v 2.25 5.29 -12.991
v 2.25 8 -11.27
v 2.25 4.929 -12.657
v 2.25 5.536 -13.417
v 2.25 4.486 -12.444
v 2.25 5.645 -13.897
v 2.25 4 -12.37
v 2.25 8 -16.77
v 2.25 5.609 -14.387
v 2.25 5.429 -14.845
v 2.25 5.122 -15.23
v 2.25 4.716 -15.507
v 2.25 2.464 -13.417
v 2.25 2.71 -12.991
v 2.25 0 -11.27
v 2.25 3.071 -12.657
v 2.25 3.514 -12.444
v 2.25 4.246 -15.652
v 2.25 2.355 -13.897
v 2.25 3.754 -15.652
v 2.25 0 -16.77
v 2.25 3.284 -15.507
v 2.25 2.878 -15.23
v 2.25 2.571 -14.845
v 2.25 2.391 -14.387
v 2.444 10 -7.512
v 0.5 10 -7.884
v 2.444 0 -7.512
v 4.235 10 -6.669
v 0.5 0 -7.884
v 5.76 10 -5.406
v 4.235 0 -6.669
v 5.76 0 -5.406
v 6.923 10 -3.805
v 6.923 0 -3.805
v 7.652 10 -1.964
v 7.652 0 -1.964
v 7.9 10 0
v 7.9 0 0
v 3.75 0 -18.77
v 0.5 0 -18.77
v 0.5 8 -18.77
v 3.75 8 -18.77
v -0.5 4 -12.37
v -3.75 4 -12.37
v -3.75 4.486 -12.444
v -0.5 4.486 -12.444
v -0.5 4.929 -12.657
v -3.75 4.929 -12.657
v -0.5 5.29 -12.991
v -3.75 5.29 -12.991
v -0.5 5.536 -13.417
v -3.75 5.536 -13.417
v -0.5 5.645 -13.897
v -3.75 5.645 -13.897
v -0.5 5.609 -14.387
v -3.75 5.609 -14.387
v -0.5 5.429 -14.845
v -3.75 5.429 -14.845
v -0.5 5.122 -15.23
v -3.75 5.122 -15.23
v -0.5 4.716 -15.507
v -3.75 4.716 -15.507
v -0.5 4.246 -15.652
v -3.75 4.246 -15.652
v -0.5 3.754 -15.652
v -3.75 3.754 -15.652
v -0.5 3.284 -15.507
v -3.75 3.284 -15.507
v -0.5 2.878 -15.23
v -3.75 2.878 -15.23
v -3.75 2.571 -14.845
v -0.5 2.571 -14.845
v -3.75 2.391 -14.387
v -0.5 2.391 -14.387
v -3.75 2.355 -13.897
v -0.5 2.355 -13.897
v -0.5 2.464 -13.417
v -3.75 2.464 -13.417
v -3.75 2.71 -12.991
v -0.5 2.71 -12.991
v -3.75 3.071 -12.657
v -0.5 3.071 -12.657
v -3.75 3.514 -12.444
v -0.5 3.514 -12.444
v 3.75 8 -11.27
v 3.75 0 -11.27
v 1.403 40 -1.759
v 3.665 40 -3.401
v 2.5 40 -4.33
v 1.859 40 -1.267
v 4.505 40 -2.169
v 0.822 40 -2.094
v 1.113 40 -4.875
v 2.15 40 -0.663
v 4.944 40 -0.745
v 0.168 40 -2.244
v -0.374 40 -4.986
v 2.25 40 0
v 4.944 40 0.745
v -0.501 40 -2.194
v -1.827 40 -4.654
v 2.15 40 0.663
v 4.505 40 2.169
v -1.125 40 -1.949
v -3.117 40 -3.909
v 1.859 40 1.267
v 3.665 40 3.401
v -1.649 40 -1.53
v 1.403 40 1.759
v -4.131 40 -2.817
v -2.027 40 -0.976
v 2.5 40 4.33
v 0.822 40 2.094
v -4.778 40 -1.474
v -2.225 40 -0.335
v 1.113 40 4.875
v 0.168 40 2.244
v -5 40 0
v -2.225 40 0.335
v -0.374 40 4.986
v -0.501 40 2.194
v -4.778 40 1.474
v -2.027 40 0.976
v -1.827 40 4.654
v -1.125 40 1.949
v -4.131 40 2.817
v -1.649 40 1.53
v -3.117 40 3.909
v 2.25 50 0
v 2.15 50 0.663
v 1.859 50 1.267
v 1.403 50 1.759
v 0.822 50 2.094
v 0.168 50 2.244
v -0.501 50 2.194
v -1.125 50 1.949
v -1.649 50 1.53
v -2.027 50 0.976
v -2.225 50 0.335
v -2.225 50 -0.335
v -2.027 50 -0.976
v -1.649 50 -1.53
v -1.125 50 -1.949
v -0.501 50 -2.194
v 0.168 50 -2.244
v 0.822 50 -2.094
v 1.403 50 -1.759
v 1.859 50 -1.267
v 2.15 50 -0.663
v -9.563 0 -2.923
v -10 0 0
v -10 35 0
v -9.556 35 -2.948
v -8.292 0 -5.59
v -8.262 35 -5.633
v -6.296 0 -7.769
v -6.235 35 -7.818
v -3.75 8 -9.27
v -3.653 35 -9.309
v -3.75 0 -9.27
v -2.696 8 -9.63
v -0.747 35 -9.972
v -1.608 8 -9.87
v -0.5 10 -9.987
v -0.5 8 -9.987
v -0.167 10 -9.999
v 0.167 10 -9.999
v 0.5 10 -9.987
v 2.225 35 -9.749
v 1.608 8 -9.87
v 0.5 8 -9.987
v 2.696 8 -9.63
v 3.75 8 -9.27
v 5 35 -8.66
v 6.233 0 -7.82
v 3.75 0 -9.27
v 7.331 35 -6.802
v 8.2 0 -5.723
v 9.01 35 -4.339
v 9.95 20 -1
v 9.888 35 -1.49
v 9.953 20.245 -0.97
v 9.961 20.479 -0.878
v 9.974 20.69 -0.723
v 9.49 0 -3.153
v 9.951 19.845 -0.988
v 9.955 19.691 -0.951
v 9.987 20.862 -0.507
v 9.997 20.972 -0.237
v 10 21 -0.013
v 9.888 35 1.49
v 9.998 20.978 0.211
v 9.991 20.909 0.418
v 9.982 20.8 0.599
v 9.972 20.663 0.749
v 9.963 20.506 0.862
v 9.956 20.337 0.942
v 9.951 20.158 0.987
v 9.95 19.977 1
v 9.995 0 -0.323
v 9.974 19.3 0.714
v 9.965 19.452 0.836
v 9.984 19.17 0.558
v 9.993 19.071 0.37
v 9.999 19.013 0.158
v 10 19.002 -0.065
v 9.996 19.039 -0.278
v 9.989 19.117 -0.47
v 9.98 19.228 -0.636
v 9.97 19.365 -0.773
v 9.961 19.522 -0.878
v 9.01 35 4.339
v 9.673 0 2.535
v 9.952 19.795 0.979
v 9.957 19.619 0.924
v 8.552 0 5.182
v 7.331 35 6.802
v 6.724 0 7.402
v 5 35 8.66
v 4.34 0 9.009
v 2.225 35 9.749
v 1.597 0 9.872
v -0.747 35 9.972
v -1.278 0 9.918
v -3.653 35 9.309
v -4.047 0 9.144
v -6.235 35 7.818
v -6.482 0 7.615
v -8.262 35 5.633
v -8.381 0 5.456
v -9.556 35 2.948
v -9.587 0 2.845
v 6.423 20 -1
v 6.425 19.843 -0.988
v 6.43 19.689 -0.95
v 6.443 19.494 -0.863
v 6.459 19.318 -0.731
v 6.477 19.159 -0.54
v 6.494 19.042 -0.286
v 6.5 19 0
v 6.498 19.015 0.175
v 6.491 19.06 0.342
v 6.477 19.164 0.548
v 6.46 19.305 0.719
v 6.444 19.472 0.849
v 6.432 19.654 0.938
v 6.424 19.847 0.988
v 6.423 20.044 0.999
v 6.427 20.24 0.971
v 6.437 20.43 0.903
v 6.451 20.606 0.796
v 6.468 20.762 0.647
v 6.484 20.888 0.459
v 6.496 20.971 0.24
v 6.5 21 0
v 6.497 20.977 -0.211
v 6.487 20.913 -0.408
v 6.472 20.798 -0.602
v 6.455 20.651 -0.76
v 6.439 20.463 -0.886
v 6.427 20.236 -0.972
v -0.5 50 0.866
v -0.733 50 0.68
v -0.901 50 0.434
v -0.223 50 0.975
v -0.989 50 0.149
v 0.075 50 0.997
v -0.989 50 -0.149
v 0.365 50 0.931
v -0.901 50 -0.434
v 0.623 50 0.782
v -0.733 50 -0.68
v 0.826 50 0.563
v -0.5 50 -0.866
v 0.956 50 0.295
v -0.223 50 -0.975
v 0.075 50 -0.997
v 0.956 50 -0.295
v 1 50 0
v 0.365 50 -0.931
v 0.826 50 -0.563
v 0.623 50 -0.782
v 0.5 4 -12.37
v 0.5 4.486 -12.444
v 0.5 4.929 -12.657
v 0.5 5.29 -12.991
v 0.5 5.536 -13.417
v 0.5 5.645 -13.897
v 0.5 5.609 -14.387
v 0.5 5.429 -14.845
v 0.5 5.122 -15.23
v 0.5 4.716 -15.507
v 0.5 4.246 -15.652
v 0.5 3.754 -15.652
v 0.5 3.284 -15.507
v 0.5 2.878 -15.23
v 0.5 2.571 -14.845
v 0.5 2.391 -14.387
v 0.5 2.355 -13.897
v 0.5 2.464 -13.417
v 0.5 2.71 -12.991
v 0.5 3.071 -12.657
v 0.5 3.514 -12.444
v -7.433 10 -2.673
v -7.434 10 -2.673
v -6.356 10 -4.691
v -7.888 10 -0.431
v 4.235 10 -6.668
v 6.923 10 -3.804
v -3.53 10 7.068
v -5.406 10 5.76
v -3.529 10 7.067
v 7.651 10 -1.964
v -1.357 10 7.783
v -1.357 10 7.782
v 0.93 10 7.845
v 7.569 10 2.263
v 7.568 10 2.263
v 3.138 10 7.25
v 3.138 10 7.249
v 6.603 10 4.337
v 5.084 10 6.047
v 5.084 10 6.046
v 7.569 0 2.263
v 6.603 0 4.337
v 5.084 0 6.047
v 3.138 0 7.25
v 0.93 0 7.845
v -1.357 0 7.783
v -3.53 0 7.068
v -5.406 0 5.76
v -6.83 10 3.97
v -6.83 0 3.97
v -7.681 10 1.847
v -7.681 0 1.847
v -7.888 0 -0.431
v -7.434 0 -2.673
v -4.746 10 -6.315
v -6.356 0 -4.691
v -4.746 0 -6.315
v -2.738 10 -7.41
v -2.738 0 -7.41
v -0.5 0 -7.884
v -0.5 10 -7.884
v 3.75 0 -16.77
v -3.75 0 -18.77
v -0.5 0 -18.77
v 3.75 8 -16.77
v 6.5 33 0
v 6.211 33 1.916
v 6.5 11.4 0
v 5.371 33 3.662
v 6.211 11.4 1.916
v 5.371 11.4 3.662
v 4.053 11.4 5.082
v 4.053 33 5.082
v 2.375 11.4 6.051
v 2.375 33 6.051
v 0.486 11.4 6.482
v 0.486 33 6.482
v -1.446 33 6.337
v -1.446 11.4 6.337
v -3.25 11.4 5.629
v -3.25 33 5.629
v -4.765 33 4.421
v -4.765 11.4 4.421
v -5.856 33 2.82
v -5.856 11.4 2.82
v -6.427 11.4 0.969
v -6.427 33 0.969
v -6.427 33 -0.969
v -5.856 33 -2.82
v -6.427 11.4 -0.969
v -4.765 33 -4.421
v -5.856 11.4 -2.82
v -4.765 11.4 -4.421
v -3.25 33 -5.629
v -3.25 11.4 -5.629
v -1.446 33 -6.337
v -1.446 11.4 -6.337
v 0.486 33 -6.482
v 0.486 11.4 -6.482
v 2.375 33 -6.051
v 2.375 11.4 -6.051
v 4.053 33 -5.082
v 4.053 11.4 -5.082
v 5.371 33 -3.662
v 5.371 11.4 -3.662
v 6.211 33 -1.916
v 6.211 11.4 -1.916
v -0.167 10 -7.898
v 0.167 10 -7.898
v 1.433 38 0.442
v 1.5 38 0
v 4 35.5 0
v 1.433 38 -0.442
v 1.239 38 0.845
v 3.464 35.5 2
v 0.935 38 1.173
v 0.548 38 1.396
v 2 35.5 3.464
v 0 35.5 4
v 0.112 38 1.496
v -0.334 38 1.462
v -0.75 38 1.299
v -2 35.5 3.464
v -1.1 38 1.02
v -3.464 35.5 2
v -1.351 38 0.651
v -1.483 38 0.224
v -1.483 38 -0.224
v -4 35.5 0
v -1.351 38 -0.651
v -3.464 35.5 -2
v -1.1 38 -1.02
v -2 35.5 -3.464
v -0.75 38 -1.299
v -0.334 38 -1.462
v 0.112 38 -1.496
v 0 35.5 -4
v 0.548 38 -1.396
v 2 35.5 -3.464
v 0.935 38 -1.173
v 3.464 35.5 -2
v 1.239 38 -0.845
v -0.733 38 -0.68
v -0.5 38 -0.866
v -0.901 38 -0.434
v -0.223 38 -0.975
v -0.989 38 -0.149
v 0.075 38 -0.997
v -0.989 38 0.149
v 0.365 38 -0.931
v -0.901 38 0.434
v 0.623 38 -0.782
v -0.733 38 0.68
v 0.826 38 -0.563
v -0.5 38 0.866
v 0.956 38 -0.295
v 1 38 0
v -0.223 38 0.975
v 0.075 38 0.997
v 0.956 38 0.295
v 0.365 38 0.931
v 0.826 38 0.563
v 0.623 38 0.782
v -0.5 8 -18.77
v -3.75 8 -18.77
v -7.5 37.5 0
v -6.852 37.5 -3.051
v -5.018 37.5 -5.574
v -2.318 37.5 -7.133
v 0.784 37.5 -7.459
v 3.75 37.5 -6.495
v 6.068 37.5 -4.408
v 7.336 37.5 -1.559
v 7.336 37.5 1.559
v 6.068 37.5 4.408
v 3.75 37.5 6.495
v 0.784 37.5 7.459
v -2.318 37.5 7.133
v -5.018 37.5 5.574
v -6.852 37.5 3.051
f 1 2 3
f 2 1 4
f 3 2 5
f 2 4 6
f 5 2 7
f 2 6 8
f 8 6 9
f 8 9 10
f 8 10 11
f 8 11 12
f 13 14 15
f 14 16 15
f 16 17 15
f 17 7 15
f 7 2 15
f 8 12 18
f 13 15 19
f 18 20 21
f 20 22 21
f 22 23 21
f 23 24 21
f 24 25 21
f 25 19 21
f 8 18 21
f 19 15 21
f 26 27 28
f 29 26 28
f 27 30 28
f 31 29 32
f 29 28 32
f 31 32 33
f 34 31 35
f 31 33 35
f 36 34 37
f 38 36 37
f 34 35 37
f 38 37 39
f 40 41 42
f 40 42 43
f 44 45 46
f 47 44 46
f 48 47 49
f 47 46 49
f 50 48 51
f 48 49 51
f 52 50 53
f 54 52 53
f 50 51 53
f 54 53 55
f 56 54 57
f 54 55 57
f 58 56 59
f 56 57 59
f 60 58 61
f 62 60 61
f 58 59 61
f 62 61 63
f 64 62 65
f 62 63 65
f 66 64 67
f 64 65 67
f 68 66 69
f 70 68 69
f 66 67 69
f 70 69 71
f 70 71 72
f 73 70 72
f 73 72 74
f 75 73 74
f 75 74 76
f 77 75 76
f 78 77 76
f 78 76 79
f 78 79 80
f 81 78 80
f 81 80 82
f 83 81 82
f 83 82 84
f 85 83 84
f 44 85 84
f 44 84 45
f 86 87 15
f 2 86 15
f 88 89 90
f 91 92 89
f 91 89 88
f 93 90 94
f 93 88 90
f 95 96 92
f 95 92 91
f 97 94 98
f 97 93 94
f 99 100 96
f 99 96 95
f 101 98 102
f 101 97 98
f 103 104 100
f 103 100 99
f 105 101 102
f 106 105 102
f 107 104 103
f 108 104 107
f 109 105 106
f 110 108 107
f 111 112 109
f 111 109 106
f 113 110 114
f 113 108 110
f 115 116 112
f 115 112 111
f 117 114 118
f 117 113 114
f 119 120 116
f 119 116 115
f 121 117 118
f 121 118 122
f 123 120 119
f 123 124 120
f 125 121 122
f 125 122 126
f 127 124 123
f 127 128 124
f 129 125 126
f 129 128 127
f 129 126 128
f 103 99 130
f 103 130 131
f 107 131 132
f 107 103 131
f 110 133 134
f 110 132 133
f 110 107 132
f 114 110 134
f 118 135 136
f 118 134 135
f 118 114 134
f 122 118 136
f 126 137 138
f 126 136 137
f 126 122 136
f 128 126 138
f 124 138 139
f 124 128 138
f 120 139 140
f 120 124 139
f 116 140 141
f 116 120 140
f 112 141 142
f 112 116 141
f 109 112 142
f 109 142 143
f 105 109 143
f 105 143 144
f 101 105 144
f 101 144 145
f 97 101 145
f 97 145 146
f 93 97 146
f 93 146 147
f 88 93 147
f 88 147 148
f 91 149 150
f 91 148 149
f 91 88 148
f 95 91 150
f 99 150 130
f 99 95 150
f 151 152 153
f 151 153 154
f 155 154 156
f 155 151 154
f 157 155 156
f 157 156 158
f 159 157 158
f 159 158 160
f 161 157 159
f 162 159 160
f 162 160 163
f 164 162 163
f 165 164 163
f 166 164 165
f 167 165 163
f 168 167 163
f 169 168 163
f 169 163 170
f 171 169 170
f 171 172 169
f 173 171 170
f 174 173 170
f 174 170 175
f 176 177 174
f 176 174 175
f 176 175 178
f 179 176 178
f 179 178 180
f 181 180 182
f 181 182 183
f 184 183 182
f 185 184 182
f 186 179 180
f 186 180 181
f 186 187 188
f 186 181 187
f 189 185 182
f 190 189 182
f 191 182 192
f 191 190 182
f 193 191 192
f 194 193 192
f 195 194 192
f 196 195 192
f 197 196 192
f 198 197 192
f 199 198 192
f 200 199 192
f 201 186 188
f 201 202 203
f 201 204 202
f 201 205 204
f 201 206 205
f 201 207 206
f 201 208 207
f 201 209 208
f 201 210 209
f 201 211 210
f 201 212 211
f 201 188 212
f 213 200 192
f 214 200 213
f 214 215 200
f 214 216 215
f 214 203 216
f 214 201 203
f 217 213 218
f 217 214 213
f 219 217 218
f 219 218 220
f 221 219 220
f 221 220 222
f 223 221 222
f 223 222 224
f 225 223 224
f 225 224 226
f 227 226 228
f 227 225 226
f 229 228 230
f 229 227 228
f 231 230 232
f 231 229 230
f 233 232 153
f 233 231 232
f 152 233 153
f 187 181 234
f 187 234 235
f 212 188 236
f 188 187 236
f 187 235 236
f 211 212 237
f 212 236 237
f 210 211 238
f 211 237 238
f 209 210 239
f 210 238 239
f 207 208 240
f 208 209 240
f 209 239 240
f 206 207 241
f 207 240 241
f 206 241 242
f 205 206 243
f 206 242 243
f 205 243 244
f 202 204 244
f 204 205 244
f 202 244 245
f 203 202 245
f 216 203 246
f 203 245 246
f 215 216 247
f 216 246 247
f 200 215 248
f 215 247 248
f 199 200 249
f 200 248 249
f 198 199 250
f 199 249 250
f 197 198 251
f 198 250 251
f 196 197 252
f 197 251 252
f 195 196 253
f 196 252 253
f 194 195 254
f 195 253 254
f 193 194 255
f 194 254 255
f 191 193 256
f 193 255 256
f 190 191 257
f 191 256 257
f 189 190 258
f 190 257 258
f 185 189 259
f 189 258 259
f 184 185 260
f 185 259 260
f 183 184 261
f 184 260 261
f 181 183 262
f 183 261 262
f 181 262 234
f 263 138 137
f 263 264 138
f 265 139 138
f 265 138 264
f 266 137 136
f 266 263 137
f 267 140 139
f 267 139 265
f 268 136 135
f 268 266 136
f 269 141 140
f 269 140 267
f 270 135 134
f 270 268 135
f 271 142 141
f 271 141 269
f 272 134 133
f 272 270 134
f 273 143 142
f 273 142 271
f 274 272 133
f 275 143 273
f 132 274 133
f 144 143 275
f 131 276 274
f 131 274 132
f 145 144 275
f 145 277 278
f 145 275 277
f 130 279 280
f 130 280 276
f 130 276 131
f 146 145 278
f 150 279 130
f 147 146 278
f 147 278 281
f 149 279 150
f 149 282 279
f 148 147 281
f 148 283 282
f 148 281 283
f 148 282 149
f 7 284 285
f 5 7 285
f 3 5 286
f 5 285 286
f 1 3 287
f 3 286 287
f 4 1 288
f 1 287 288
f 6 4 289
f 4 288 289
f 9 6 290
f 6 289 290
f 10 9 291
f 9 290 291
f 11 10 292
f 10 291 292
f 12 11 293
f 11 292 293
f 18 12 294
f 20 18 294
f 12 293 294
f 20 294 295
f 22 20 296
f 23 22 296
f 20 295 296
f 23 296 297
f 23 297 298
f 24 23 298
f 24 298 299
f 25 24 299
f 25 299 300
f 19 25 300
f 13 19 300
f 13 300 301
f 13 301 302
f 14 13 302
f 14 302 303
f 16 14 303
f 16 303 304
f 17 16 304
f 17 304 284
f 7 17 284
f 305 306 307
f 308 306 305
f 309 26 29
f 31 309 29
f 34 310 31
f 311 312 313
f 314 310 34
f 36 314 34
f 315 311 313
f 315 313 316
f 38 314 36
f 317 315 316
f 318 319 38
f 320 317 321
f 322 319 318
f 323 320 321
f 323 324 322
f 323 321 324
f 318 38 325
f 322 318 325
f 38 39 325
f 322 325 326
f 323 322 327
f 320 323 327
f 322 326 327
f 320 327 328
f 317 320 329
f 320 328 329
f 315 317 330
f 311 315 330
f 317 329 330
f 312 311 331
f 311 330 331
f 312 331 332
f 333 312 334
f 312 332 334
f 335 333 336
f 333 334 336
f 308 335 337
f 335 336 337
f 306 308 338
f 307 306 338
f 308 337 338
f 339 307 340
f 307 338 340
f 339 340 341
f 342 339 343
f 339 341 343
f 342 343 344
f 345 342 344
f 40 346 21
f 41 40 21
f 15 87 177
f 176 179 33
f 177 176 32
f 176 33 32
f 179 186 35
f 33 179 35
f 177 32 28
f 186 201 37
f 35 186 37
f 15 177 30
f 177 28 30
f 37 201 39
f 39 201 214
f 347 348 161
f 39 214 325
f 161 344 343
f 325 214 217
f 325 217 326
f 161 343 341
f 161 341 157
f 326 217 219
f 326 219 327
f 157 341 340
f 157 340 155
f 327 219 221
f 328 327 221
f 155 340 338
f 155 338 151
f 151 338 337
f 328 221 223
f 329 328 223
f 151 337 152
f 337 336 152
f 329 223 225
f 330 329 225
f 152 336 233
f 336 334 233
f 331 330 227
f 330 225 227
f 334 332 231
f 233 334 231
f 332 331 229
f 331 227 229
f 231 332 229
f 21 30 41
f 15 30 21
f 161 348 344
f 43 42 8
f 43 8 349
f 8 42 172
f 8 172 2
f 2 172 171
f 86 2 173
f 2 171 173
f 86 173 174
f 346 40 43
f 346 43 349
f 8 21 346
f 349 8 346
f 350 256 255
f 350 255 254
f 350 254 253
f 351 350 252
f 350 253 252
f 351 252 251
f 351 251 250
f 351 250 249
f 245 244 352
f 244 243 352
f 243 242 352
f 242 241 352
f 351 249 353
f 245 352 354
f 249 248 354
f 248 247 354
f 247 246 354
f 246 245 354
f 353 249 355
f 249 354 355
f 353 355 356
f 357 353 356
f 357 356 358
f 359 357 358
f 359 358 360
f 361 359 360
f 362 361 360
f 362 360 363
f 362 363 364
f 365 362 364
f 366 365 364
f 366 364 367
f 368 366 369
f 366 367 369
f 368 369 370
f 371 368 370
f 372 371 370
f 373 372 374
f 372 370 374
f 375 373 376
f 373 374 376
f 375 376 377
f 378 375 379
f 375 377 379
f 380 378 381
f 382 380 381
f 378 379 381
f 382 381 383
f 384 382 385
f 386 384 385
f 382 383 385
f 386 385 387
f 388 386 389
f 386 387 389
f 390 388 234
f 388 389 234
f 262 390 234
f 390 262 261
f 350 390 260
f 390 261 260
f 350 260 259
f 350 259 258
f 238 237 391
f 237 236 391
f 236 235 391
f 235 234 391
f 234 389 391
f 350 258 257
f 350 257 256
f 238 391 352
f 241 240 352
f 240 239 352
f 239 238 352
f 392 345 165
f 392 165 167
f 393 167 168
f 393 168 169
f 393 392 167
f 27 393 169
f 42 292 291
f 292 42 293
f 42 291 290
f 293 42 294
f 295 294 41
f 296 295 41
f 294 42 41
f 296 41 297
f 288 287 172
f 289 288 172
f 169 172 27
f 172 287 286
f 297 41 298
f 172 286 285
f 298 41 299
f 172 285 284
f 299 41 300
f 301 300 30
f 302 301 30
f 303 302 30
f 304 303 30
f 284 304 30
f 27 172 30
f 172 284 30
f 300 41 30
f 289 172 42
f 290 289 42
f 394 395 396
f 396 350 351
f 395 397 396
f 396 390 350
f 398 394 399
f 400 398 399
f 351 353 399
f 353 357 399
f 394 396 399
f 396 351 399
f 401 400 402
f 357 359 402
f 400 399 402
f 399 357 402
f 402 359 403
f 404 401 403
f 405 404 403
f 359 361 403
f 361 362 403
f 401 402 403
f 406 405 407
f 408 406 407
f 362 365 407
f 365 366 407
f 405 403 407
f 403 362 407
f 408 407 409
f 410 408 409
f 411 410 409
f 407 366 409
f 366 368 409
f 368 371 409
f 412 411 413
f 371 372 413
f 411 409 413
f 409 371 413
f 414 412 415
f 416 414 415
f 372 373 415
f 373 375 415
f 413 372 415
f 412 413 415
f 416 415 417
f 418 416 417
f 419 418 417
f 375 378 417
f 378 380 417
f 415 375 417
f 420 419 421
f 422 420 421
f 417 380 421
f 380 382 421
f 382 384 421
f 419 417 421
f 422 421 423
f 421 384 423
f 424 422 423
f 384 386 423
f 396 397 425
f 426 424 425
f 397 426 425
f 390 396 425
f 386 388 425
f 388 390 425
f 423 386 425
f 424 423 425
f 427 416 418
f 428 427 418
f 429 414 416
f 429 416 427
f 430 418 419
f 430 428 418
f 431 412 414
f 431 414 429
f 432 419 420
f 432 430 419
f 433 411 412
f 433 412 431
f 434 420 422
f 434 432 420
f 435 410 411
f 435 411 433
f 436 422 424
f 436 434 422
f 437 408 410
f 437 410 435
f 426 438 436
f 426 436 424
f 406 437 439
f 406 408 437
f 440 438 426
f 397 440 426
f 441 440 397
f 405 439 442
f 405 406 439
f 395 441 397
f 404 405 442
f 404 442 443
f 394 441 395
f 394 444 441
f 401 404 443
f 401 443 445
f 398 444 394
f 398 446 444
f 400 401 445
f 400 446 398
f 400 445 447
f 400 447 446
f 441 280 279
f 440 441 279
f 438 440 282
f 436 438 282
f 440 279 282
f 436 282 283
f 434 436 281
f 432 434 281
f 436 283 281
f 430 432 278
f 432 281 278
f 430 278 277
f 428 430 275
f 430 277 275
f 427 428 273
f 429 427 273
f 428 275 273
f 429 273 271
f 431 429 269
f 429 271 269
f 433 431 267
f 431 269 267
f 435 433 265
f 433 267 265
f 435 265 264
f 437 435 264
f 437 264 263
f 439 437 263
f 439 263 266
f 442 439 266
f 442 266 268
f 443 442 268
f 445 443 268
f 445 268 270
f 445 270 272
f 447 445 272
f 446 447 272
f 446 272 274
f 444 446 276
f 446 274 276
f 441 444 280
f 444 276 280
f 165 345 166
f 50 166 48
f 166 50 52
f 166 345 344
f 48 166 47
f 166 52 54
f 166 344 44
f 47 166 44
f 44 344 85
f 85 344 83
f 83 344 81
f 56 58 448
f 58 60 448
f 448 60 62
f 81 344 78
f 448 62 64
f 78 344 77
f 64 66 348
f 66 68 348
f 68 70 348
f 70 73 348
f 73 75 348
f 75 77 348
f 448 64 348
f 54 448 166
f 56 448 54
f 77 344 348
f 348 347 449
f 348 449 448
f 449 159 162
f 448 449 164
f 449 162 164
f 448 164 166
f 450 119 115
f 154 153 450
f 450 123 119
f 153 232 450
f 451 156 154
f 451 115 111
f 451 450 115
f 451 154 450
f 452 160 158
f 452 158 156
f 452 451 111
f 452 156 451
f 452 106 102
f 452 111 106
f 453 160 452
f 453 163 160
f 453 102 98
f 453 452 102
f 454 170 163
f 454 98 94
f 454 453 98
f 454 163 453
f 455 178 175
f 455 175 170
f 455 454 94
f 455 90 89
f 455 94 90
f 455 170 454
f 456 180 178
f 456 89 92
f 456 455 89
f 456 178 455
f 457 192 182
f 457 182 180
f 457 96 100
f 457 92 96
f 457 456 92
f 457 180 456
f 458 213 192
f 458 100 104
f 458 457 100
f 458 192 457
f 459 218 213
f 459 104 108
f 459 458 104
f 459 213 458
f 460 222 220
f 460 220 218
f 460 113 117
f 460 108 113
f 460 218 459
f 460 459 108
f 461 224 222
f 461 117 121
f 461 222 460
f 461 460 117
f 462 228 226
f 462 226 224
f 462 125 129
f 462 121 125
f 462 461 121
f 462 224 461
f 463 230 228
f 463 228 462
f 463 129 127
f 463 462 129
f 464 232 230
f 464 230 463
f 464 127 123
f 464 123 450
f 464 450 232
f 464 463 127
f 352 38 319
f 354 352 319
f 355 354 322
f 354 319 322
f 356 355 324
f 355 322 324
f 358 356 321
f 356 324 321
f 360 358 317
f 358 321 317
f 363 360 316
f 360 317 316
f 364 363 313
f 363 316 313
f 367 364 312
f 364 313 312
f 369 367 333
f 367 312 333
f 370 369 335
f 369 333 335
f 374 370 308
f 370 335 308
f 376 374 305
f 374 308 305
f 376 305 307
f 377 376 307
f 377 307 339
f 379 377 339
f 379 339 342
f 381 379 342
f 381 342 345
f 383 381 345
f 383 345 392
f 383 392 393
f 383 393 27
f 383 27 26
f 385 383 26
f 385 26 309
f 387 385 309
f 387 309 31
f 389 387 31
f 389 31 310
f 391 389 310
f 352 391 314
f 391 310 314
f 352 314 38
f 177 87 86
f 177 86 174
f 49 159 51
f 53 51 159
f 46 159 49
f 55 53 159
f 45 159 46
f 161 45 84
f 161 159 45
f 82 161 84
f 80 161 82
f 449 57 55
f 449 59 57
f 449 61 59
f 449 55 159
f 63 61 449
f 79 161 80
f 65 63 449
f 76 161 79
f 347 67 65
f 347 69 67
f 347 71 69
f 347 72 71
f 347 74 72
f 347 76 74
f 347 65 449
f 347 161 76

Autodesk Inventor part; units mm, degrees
ref_plane "YZ Plane" through (0, 0, 0) normal (1, 0, 0) x (0, 1, 0)
ref_plane "XZ Plane" through (0, 0, 0) normal (0, 1, 0) x (-1, 0, 0)
ref_plane "XY Plane" through (0, 0, 0) normal (0, 0, 1) x (1, 0, 0)
sketch "Sketch1" plane through (0, 0, 0) normal (0, 1, 0) x (-1, 0, 0)
  circle A0 centre (0, 0) radius 10
  dimension "d0" = 20
extrude "Extrusion1" add sketch "Sketch1" along normal blind 40
sketch "Sketch2" plane through (0, 40, 0) normal (0, 1, 0) x (1, 0, 0)
  circle A0 centre (0, 0) radius 2.25
  dimension "d3" = 4.5
extrude "Extrusion2" add sketch "Sketch2" along normal blind 10
sketch "Sketch3" plane through (0, 50, 0) normal (0, 1, 0) x (1, 0, 0)
  circle A0 centre (0, 0) radius 1
  dimension "d6" = 2
extrude "Extrusion3" cut sketch "Sketch3" against normal through all
sketch "Sketch4" plane through (0, 0, 0) normal (0, -1, 0) x (1, 0, 0)
  circle A0 centre (0, 0) radius 7.9
  dimension "d9" = 15.8
extrude "Extrusion4" cut sketch "Sketch4" against normal blind 10
sketch "Sketch5" plane through (0, 10, 0) normal (0, -1, 0) x (1, 0, 0)
  circle A0 centre (0, 0) radius 6.5
  dimension "d12" = 13
extrude "Extrusion5" cut sketch "Sketch5" against normal blind 28
chamfer "Chamfer2" distance 5 angle 45 1 edges at (-6.5, 38, 0)
chamfer "Chamfer3" distance 1.4 angle 45 1 edges at (-6.5, 10, 0)
sketch "Sketch6" plane through (0, 0, 0) normal (0, -1, 0) x (1, 0, 0)
  line L0 (3.75, -9.2702) -> (-3.75, -9.2702)
  line L1 (-3.75, -9.2702) -> (-3.75, -18.7702)
  line L2 (-3.75, -18.7702) -> (3.75, -18.7702)
  line L3 (3.75, -18.7702) -> (3.75, -9.2702)
  circle A0 centre (0, 0) radius 10 projected
  point P0 (-3.75, -9.2702)
  dimension "d24" = 9.5
  dimension "d25" = 7.5
  dimension "d26" = 3.75
extrude "Extrusion6" add sketch "Sketch6" against normal blind 8 contours L3 L2 L1 A0
sketch "Sketch7" plane through (0, 0, 0) normal (0, -1, 0) x (1, 0, 0)
  line L0 (3.75, -11.2702) -> (2.25, -11.2702)
  line L1 (2.25, -11.2702) -> (2.25, -16.7702)
  line L2 (2.25, -16.7702) -> (3.75, -16.7702)
  line L3 (3.75, -16.7702) -> (3.75, -11.2702)
  line L4 (-3.75, -18.7702) -> (3.75, -18.7702) projected
  line L5 (3.75, -18.7702) -> (3.75, -9.2702) projected
  point P0 (0, 0)
  dimension "d29" = 1.5
  dimension "d30" = 5.5
  dimension "d31" = 2
extrude "Extrusion7" cut sketch "Sketch7" against normal through all
sketch "Sketch8" plane through (0, 0, 0) normal (0, -1, 0) x (1, 0, 0)
  line L0 (-0.5, -18.7702) -> (0.5, -18.7702)
  line L1 (0.5, -18.7702) -> (0.5, -7.8842)
  line L2 (0.5, -7.8842) -> (-0.5, -7.8842)
  line L3 (-0.5, -7.8842) -> (-0.5, -18.7702)
  line L4 (-3.75, -18.7702) -> (3.75, -18.7702) projected
  circle A0 centre (0, 0) radius 7.9 projected
  dimension "d34" = 1
  dimension "d35" = 0.5
extrude "Extrusion8" cut sketch "Sketch8" against normal blind 10 contours L3 A0 L1 L0
sketch "Sketch9" plane through (-3.75, 0, -18.7702) normal (-1, 0, 0) x (0, 0, 1)
  circle A0 centre (4.75, 4) radius 1.65
  line L0 (0, 0) -> (0, 8) projected
  line L1 (0, 8) -> (9.5, 8) projected
  point P0 (18.7702, 0)
  dimension "d38" = 3.3
  dimension "d39" = 4.75
  dimension "d40" = 4
extrude "Extrusion9" cut sketch "Sketch9" against normal through all
chamfer "Chamfer4" distance 5 angle 45 1 edges at (10, 40, 0)
sketch "Sketch10" plane through (3.75, 0, -18.7702) normal (1, 0, 0) x (0, 0, -1)
  circle A0 centre (-18.7702, 20) radius 1
  line L0 (0, 0) -> (-2, 0) projected
  point P0 (-18.7702, 0)
  dimension "d46" = 2
  dimension "d47" = 20
  dimension "d48" = 0
extrude "Extrusion10" cut sketch "Sketch10" along normal through all
properties part number "OMEGAETTE_HOUSING"
